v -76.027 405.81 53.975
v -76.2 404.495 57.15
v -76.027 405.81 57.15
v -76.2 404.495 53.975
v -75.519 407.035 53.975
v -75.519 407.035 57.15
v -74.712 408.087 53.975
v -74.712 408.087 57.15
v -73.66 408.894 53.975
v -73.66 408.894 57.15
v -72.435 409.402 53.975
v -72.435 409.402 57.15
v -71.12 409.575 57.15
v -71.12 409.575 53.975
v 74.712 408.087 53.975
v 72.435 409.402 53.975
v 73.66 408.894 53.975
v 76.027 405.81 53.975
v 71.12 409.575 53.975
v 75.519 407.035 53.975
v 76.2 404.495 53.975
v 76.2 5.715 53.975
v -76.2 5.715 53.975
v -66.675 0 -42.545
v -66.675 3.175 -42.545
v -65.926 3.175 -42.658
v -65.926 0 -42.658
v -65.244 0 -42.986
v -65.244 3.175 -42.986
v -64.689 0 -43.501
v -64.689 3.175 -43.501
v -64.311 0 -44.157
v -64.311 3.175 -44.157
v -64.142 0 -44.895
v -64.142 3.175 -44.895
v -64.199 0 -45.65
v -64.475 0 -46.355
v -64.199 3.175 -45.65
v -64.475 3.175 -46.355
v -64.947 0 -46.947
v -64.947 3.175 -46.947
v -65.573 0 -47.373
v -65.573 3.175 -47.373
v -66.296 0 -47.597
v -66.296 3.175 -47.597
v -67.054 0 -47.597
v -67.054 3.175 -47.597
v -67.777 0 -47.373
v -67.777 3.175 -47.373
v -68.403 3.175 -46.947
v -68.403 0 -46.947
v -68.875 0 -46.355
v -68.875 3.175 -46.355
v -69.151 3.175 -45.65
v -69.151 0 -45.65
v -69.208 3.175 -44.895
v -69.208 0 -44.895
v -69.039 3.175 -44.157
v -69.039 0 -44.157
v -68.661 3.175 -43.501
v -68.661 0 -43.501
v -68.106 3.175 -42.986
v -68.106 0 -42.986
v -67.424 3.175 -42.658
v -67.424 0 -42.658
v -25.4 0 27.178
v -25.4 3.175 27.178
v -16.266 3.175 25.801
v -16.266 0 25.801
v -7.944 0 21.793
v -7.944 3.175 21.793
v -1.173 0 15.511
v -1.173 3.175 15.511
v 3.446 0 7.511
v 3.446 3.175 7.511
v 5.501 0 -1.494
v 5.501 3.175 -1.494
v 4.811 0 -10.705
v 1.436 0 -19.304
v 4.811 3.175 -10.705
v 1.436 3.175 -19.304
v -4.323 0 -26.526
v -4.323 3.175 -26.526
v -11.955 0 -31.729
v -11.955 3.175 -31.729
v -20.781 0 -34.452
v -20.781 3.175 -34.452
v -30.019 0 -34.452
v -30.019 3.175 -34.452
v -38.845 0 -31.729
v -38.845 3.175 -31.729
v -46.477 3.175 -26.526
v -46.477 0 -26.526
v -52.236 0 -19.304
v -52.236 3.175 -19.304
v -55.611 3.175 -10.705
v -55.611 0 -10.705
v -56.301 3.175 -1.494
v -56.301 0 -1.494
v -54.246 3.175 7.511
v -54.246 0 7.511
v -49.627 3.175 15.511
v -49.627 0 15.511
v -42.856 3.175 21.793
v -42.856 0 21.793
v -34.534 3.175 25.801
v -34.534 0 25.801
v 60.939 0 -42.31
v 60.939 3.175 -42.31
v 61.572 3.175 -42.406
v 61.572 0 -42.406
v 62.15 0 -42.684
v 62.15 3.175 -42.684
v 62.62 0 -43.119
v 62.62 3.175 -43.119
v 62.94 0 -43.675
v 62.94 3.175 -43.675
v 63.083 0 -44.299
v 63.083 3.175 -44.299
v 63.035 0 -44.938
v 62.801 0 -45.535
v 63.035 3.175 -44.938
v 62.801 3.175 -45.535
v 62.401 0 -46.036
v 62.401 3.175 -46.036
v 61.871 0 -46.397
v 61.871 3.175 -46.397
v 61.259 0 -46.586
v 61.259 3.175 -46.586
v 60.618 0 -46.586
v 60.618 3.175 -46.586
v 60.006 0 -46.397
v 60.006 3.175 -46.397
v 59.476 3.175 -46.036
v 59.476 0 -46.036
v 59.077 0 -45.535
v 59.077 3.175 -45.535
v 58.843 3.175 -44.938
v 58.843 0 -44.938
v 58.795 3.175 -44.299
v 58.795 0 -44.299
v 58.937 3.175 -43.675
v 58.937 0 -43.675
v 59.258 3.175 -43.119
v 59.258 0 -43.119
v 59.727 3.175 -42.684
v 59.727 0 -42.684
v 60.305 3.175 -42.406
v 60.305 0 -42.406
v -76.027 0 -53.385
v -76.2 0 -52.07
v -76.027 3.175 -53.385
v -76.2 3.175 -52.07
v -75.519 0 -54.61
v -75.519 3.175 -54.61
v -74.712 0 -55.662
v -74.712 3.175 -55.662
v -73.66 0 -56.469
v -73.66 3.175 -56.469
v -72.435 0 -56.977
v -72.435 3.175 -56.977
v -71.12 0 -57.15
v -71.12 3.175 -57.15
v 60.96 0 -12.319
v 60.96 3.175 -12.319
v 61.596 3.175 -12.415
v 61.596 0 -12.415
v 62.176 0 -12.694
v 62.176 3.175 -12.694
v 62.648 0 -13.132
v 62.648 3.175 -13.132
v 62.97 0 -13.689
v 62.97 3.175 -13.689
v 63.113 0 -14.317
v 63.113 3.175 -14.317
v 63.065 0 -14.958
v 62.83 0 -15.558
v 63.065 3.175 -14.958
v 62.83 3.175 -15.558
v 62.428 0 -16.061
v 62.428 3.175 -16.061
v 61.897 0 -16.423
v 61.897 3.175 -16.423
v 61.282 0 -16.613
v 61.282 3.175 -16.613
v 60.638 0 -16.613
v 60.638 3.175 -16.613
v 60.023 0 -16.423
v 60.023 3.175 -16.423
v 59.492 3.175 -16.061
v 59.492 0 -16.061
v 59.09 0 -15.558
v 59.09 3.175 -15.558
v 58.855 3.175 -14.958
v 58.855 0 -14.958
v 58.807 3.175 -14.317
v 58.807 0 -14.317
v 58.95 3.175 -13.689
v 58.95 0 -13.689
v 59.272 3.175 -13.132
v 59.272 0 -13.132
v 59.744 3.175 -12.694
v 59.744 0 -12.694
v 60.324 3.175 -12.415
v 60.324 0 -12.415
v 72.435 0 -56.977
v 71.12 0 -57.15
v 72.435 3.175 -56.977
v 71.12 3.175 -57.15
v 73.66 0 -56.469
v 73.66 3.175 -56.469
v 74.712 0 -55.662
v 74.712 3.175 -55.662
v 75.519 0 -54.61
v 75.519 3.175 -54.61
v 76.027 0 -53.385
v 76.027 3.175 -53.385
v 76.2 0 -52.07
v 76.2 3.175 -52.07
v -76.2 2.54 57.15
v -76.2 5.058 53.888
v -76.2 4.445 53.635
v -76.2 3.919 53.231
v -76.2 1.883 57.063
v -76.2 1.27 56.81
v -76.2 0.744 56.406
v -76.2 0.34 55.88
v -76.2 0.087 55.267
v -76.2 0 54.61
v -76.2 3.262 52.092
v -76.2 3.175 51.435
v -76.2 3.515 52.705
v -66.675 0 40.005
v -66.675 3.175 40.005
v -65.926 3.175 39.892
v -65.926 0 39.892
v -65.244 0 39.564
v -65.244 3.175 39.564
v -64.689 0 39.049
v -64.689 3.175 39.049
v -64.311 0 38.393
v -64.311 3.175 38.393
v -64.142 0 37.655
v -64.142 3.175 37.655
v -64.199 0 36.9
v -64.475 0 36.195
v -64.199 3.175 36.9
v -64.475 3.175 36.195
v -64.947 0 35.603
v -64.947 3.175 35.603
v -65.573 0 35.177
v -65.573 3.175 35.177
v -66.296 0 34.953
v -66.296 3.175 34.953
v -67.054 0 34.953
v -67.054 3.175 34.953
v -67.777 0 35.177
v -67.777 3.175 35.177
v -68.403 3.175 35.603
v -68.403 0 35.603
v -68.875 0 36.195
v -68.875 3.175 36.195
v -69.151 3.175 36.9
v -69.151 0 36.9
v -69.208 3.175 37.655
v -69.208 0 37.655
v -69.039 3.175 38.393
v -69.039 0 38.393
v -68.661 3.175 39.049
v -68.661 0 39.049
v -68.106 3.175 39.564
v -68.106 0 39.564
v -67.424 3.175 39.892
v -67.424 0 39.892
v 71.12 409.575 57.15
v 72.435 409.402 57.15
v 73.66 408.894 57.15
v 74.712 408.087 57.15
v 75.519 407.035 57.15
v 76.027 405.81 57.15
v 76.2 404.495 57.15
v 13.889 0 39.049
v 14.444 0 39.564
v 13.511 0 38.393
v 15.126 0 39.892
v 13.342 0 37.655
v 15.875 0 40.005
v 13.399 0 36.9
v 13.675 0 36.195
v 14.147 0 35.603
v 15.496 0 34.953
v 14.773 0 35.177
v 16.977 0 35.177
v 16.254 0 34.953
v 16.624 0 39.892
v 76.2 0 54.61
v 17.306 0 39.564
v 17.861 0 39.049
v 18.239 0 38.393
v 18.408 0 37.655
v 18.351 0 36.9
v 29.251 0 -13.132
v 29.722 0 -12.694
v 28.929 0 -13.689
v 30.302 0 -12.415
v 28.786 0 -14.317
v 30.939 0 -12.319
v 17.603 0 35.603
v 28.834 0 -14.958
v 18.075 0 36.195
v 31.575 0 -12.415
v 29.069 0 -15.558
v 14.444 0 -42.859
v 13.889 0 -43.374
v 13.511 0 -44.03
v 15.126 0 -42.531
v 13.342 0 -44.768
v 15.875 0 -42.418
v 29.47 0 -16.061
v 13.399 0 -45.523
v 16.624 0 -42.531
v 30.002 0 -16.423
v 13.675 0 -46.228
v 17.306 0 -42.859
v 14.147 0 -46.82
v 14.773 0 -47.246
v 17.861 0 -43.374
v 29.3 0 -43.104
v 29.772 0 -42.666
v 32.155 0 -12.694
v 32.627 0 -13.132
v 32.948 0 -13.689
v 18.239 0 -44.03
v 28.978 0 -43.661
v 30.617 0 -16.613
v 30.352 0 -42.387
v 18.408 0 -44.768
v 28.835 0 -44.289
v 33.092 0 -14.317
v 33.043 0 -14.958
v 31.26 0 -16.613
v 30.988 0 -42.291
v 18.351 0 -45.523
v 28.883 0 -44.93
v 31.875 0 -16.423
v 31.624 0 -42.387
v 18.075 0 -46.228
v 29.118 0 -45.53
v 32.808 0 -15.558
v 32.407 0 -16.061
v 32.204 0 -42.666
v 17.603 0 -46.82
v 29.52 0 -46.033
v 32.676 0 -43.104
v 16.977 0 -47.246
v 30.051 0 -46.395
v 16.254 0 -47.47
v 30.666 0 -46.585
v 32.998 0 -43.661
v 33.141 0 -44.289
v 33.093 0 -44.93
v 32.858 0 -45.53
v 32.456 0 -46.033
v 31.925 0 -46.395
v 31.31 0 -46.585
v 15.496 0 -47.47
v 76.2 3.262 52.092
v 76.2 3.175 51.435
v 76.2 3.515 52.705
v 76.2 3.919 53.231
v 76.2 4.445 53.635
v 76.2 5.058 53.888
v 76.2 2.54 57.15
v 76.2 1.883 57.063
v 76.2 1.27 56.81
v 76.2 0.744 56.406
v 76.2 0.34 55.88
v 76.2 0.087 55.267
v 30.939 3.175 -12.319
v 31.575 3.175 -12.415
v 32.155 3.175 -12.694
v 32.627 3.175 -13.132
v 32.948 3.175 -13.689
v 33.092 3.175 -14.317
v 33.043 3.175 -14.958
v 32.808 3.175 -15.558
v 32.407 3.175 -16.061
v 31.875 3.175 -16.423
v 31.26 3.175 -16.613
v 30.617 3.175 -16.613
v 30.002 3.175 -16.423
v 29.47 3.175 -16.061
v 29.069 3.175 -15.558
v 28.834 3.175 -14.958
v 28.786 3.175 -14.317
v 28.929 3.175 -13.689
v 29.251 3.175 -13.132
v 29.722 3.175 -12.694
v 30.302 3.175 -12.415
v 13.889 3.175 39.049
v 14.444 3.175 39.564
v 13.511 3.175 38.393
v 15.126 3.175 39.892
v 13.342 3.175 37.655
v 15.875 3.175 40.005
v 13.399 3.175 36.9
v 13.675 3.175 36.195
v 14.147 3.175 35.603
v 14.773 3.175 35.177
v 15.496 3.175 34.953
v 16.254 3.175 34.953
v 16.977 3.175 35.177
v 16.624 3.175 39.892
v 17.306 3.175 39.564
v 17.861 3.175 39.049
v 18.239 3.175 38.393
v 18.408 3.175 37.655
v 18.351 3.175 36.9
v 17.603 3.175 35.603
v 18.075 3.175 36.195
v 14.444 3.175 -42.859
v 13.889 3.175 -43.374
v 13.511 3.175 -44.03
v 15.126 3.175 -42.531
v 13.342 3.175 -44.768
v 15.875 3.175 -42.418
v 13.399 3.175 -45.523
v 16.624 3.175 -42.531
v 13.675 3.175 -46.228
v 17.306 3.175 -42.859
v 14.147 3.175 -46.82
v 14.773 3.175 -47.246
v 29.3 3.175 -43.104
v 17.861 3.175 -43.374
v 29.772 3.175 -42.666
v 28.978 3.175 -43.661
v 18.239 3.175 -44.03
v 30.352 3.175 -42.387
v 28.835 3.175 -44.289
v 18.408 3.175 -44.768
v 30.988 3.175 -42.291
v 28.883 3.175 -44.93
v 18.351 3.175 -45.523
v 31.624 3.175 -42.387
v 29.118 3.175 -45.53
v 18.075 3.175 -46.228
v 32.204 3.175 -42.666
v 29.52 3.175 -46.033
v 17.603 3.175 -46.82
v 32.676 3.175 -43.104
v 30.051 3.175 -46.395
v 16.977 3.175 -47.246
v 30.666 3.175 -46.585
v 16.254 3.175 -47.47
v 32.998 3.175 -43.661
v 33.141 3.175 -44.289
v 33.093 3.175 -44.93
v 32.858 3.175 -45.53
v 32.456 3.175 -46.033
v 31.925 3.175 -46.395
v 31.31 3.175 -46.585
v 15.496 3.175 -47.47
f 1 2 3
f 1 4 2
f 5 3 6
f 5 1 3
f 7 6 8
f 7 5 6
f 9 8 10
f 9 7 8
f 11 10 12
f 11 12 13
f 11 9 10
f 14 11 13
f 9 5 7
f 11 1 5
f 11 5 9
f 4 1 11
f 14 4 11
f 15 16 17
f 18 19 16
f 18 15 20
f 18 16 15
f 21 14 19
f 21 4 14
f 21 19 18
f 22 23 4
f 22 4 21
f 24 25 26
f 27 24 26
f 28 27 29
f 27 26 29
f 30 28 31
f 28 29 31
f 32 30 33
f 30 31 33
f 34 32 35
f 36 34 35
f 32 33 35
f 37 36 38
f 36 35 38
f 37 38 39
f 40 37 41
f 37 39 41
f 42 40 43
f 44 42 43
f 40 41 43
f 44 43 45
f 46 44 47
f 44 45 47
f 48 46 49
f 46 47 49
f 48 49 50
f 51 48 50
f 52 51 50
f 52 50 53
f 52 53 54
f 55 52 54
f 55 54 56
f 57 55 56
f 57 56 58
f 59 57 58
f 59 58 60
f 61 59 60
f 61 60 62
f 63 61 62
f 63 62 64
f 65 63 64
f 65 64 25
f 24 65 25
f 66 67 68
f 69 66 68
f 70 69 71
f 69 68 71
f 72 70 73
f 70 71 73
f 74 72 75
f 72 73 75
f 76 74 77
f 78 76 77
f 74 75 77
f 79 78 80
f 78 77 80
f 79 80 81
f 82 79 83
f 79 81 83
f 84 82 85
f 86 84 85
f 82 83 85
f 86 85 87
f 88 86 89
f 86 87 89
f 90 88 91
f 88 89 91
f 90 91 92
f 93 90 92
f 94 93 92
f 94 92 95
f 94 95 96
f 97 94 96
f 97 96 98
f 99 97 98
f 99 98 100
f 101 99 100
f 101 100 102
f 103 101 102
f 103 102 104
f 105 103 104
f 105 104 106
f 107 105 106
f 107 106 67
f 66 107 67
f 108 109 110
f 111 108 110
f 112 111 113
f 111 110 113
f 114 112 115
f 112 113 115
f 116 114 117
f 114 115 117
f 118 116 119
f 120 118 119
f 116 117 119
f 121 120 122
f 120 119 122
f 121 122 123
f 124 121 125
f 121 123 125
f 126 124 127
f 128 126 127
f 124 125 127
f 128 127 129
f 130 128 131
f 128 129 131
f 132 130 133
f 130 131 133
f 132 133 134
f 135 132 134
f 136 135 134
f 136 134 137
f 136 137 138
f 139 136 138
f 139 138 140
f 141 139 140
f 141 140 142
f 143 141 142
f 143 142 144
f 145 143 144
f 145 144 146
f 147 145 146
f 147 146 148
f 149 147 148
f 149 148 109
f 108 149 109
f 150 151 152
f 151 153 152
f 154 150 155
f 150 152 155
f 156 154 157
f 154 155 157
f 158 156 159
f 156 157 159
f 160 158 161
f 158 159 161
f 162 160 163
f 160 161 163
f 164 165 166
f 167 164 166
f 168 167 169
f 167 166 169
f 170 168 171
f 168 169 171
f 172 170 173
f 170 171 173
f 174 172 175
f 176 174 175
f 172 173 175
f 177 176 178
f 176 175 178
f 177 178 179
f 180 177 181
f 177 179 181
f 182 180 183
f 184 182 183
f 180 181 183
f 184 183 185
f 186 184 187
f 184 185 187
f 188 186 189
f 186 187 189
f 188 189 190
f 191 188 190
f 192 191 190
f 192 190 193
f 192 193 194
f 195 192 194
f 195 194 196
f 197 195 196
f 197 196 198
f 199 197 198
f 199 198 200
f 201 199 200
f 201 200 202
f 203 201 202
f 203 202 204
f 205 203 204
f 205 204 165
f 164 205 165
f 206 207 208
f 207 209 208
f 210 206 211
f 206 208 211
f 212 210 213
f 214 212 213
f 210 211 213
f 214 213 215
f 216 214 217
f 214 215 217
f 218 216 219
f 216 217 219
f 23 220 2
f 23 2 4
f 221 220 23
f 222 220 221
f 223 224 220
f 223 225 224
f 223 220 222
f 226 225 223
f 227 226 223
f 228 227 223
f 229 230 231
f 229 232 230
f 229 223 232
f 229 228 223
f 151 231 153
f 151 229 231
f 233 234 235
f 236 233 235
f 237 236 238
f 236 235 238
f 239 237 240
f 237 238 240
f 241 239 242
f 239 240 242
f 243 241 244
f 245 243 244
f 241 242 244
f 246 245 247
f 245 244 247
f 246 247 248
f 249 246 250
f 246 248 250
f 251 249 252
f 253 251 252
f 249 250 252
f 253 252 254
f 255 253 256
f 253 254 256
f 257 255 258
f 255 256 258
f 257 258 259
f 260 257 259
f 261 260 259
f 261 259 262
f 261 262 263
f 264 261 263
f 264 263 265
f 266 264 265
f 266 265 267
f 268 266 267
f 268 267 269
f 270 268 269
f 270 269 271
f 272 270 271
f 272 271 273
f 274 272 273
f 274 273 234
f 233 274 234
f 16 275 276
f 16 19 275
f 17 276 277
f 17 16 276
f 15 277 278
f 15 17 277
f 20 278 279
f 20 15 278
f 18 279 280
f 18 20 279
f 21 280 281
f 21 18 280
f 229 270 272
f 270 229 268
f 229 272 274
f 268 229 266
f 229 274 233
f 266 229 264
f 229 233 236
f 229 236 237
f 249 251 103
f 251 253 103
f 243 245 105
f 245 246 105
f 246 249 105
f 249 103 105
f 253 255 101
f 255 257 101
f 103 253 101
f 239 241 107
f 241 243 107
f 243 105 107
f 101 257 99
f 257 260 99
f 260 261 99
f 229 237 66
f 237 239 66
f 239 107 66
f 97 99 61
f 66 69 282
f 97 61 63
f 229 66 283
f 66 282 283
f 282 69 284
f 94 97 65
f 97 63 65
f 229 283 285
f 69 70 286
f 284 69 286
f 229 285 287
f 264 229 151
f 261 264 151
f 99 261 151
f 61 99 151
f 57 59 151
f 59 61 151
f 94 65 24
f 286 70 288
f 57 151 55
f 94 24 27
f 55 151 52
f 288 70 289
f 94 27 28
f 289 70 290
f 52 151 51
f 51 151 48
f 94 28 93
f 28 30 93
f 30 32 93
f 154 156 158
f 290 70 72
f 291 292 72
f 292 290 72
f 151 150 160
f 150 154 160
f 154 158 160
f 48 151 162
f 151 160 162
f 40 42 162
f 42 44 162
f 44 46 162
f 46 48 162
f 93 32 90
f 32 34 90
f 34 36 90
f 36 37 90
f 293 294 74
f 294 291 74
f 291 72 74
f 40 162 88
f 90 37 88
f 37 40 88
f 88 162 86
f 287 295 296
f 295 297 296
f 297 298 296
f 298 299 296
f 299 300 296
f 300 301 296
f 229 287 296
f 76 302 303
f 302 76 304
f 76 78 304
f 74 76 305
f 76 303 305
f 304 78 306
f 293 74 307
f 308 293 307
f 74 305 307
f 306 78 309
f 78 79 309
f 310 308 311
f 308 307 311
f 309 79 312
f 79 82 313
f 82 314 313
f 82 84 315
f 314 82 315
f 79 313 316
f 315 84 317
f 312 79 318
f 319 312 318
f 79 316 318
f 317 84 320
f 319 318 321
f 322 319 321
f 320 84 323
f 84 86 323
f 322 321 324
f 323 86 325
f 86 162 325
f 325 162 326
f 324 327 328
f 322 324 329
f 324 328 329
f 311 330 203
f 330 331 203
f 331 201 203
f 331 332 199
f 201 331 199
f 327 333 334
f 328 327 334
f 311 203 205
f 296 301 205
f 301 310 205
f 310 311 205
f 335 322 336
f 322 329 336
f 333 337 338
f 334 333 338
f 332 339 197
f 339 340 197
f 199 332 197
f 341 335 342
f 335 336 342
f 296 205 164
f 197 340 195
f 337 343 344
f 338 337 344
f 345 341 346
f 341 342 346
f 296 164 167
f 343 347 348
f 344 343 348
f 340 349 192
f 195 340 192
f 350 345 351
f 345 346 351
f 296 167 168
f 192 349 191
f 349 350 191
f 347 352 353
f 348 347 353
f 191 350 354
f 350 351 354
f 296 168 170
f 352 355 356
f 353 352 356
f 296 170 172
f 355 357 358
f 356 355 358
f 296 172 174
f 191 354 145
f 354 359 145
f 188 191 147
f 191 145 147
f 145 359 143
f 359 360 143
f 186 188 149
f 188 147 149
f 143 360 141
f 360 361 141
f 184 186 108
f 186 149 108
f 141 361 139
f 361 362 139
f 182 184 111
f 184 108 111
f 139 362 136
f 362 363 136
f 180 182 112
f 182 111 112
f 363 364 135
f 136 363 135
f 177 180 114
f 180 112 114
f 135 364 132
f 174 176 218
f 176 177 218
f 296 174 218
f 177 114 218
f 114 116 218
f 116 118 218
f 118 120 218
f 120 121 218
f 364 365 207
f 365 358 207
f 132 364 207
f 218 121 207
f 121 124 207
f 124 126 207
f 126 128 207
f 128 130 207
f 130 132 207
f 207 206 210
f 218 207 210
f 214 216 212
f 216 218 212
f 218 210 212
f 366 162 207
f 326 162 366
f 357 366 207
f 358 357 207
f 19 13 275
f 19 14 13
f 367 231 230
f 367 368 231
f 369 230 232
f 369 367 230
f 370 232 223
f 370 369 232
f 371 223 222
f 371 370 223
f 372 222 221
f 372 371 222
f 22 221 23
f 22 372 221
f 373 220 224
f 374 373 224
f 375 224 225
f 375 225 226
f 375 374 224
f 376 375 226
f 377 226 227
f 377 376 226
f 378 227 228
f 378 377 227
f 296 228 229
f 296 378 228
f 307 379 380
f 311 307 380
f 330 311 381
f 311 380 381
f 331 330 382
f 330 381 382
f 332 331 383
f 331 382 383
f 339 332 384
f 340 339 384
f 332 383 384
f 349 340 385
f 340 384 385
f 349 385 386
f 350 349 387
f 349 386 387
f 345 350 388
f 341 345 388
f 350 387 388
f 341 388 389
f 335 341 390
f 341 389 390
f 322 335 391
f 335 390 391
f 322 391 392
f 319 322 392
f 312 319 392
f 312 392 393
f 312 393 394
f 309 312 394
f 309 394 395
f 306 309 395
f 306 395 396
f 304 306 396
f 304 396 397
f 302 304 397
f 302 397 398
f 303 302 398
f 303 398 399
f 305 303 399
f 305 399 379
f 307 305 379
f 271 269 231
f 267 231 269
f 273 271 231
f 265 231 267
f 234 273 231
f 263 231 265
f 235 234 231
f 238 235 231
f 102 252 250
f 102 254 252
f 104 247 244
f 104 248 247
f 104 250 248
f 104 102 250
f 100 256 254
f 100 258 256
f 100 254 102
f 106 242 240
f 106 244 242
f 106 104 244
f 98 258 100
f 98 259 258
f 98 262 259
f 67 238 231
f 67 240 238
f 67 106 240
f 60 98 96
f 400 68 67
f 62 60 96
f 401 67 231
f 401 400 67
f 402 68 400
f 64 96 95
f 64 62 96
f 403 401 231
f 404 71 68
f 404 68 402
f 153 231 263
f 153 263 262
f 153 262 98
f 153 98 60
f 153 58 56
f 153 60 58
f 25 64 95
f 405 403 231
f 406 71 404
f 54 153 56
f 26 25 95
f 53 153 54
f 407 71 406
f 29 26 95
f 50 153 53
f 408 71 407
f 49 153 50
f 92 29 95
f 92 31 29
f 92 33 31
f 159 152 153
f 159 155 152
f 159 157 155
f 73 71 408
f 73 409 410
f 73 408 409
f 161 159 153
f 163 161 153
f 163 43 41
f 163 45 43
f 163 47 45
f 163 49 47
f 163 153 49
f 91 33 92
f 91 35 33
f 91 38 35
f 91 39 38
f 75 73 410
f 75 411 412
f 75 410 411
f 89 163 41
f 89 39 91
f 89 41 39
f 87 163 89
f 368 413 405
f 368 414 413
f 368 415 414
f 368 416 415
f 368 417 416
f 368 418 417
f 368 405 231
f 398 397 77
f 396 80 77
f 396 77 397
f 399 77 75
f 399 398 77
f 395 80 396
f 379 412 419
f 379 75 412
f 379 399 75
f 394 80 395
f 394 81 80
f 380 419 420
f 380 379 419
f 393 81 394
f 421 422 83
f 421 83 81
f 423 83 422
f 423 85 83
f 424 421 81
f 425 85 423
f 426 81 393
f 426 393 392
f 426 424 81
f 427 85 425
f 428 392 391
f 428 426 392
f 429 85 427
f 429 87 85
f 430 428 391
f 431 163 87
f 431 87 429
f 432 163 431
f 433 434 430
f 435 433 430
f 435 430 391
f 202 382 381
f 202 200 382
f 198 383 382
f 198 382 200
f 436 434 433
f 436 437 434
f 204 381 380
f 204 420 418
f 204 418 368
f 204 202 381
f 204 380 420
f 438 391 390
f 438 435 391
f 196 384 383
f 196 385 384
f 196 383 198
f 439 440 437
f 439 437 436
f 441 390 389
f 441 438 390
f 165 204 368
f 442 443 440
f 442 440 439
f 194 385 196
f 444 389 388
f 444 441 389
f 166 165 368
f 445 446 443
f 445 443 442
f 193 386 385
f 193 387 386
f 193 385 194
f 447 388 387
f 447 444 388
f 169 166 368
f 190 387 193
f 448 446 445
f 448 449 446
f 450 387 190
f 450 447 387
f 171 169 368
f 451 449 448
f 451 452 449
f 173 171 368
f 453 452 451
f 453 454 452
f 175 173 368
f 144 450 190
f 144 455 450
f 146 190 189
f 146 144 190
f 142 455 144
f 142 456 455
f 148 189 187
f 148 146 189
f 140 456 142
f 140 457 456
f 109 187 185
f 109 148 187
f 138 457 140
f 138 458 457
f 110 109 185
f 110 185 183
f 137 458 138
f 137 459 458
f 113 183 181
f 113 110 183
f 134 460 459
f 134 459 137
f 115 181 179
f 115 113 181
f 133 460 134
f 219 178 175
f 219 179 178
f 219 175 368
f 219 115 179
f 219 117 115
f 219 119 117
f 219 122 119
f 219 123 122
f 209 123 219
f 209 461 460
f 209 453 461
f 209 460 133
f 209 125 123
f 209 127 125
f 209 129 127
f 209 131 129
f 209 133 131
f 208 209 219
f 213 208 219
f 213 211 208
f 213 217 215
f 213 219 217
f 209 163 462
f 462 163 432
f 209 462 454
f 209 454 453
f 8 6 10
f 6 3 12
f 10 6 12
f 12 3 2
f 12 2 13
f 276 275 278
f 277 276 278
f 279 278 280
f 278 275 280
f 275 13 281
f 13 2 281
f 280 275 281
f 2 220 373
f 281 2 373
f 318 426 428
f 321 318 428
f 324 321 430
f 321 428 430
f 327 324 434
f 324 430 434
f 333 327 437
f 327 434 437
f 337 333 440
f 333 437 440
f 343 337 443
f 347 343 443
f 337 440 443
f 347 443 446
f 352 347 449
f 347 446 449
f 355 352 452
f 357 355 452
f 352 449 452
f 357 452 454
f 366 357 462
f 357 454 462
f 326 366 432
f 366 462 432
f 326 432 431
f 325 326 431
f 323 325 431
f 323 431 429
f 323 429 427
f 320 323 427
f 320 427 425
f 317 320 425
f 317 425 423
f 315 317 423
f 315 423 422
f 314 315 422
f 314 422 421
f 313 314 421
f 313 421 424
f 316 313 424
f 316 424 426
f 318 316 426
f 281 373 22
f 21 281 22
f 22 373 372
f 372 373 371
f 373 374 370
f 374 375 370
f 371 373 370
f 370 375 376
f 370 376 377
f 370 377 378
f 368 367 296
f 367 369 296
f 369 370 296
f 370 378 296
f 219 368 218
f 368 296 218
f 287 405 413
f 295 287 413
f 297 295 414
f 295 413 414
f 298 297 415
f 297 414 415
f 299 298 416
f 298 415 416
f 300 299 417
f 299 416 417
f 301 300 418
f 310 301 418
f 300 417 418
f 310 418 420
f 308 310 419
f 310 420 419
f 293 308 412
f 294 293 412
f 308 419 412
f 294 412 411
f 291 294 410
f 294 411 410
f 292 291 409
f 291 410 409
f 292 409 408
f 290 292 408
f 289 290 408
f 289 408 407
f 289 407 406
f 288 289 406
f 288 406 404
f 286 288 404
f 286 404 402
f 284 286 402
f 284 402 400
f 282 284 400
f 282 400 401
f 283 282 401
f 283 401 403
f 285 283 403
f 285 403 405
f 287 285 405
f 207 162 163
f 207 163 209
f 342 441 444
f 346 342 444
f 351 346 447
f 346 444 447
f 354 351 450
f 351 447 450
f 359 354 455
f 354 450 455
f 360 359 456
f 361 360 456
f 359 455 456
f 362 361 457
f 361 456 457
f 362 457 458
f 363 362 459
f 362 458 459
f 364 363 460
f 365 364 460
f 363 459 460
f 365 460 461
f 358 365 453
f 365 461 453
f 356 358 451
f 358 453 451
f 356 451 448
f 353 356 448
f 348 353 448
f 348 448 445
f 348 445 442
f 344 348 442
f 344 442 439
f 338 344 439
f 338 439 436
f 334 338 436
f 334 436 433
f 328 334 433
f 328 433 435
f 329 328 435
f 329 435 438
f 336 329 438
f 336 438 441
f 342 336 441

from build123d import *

# Parameters (mm, degrees)
SKETCH1_W           = 152.4
SKETCH1_H           = 114.3
BOSS_EXTRUDE1_DEPTH = 3.175
SKETCH2_W           = 152.4
SKETCH2_H           = 3.175
BOSS_EXTRUDE2_DEPTH = 406.4
FILLET1_R           = 2.54
FILLET2_R           = 5.08
SKETCH3_R           = 30.988
SKETCH3_R_2         = 2.54
SKETCH3_R_3         = 2.159
SKETCH3_R_4         = 2.15
CUT_EXTRUDE1_DEPTH  = 418.41289211


with BuildPart() as part:
    # Sketch1 → Boss-Extrude1 (new body)
    with BuildSketch(Plane(origin=(0, 0, 0), x_dir=(1, 0, 0), z_dir=(0, 1, 0))):
        Rectangle(SKETCH1_W, SKETCH1_H)
    extrude(amount=BOSS_EXTRUDE1_DEPTH)

    # Sketch2 → Boss-Extrude2 (add)
    with BuildSketch(Plane(origin=(0, 3.175, 0), x_dir=(1, 0, 0), z_dir=(0, 1, 0))):
        with Locations((0, -55.5625)):
            Rectangle(SKETCH2_W, SKETCH2_H)
    extrude(amount=BOSS_EXTRUDE2_DEPTH)

    # Fillet1
    fillet1_edges = [part.edges().sort_by_distance(p)[0] for p in [
        (0, 3.175, 53.975),
        (0, 0, 57.15),
    ]]
    fillet(fillet1_edges, radius=FILLET1_R)

    # Fillet2
    fillet2_edges = [part.edges().sort_by_distance(p)[0] for p in [
        (-76.2, 409.575, 55.5625),
        (76.2, 409.575, 55.5625),
        (-76.2, 1.5875, -57.15),
        (76.2, 1.5875, -57.15),
    ]]
    fillet(fillet2_edges, radius=FILLET2_R)

    # Sketch3 → Cut-Extrude1 (cut, through all)
    with BuildSketch(Plane(origin=(0, 3.175, 0), x_dir=(1, 0, 0), z_dir=(0, 1, 0))):
        with Locations(Location((-25.4, 3.81, 0), (0, 0, 270))):
            Circle(SKETCH3_R)
        with Locations(Location((15.875, 44.958, 0), (0, 0, 270))):
            Circle(SKETCH3_R_2)
        with Locations(Location((-66.675, -37.465, 0), (0, 0, 270))):
            Circle(SKETCH3_R_2)
        with Locations(Location((15.875, -37.465, 0), (0, 0, 270))):
            Circle(SKETCH3_R_2)
        with Locations(Location((30.988, 44.45, 0), (0, 0, 270))):
            Circle(SKETCH3_R_3)
        with Locations(Location((60.93860251, 44.46, 0), (0, 0, 270))):
            Circle(SKETCH3_R_4)
        with Locations(Location((60.96, 14.478, 0), (0, 0, 270))):
            Circle(SKETCH3_R_3)
        with Locations(Location((30.93860251, 14.478, 0), (0, 0, 270))):
            Circle(SKETCH3_R_3)
        with Locations(Location((-66.675, 45.085, 0), (0, 0, 270))):
            Circle(SKETCH3_R_2)
    extrude(amount=-CUT_EXTRUDE1_DEPTH, mode=Mode.SUBTRACT)


solid = part.part
